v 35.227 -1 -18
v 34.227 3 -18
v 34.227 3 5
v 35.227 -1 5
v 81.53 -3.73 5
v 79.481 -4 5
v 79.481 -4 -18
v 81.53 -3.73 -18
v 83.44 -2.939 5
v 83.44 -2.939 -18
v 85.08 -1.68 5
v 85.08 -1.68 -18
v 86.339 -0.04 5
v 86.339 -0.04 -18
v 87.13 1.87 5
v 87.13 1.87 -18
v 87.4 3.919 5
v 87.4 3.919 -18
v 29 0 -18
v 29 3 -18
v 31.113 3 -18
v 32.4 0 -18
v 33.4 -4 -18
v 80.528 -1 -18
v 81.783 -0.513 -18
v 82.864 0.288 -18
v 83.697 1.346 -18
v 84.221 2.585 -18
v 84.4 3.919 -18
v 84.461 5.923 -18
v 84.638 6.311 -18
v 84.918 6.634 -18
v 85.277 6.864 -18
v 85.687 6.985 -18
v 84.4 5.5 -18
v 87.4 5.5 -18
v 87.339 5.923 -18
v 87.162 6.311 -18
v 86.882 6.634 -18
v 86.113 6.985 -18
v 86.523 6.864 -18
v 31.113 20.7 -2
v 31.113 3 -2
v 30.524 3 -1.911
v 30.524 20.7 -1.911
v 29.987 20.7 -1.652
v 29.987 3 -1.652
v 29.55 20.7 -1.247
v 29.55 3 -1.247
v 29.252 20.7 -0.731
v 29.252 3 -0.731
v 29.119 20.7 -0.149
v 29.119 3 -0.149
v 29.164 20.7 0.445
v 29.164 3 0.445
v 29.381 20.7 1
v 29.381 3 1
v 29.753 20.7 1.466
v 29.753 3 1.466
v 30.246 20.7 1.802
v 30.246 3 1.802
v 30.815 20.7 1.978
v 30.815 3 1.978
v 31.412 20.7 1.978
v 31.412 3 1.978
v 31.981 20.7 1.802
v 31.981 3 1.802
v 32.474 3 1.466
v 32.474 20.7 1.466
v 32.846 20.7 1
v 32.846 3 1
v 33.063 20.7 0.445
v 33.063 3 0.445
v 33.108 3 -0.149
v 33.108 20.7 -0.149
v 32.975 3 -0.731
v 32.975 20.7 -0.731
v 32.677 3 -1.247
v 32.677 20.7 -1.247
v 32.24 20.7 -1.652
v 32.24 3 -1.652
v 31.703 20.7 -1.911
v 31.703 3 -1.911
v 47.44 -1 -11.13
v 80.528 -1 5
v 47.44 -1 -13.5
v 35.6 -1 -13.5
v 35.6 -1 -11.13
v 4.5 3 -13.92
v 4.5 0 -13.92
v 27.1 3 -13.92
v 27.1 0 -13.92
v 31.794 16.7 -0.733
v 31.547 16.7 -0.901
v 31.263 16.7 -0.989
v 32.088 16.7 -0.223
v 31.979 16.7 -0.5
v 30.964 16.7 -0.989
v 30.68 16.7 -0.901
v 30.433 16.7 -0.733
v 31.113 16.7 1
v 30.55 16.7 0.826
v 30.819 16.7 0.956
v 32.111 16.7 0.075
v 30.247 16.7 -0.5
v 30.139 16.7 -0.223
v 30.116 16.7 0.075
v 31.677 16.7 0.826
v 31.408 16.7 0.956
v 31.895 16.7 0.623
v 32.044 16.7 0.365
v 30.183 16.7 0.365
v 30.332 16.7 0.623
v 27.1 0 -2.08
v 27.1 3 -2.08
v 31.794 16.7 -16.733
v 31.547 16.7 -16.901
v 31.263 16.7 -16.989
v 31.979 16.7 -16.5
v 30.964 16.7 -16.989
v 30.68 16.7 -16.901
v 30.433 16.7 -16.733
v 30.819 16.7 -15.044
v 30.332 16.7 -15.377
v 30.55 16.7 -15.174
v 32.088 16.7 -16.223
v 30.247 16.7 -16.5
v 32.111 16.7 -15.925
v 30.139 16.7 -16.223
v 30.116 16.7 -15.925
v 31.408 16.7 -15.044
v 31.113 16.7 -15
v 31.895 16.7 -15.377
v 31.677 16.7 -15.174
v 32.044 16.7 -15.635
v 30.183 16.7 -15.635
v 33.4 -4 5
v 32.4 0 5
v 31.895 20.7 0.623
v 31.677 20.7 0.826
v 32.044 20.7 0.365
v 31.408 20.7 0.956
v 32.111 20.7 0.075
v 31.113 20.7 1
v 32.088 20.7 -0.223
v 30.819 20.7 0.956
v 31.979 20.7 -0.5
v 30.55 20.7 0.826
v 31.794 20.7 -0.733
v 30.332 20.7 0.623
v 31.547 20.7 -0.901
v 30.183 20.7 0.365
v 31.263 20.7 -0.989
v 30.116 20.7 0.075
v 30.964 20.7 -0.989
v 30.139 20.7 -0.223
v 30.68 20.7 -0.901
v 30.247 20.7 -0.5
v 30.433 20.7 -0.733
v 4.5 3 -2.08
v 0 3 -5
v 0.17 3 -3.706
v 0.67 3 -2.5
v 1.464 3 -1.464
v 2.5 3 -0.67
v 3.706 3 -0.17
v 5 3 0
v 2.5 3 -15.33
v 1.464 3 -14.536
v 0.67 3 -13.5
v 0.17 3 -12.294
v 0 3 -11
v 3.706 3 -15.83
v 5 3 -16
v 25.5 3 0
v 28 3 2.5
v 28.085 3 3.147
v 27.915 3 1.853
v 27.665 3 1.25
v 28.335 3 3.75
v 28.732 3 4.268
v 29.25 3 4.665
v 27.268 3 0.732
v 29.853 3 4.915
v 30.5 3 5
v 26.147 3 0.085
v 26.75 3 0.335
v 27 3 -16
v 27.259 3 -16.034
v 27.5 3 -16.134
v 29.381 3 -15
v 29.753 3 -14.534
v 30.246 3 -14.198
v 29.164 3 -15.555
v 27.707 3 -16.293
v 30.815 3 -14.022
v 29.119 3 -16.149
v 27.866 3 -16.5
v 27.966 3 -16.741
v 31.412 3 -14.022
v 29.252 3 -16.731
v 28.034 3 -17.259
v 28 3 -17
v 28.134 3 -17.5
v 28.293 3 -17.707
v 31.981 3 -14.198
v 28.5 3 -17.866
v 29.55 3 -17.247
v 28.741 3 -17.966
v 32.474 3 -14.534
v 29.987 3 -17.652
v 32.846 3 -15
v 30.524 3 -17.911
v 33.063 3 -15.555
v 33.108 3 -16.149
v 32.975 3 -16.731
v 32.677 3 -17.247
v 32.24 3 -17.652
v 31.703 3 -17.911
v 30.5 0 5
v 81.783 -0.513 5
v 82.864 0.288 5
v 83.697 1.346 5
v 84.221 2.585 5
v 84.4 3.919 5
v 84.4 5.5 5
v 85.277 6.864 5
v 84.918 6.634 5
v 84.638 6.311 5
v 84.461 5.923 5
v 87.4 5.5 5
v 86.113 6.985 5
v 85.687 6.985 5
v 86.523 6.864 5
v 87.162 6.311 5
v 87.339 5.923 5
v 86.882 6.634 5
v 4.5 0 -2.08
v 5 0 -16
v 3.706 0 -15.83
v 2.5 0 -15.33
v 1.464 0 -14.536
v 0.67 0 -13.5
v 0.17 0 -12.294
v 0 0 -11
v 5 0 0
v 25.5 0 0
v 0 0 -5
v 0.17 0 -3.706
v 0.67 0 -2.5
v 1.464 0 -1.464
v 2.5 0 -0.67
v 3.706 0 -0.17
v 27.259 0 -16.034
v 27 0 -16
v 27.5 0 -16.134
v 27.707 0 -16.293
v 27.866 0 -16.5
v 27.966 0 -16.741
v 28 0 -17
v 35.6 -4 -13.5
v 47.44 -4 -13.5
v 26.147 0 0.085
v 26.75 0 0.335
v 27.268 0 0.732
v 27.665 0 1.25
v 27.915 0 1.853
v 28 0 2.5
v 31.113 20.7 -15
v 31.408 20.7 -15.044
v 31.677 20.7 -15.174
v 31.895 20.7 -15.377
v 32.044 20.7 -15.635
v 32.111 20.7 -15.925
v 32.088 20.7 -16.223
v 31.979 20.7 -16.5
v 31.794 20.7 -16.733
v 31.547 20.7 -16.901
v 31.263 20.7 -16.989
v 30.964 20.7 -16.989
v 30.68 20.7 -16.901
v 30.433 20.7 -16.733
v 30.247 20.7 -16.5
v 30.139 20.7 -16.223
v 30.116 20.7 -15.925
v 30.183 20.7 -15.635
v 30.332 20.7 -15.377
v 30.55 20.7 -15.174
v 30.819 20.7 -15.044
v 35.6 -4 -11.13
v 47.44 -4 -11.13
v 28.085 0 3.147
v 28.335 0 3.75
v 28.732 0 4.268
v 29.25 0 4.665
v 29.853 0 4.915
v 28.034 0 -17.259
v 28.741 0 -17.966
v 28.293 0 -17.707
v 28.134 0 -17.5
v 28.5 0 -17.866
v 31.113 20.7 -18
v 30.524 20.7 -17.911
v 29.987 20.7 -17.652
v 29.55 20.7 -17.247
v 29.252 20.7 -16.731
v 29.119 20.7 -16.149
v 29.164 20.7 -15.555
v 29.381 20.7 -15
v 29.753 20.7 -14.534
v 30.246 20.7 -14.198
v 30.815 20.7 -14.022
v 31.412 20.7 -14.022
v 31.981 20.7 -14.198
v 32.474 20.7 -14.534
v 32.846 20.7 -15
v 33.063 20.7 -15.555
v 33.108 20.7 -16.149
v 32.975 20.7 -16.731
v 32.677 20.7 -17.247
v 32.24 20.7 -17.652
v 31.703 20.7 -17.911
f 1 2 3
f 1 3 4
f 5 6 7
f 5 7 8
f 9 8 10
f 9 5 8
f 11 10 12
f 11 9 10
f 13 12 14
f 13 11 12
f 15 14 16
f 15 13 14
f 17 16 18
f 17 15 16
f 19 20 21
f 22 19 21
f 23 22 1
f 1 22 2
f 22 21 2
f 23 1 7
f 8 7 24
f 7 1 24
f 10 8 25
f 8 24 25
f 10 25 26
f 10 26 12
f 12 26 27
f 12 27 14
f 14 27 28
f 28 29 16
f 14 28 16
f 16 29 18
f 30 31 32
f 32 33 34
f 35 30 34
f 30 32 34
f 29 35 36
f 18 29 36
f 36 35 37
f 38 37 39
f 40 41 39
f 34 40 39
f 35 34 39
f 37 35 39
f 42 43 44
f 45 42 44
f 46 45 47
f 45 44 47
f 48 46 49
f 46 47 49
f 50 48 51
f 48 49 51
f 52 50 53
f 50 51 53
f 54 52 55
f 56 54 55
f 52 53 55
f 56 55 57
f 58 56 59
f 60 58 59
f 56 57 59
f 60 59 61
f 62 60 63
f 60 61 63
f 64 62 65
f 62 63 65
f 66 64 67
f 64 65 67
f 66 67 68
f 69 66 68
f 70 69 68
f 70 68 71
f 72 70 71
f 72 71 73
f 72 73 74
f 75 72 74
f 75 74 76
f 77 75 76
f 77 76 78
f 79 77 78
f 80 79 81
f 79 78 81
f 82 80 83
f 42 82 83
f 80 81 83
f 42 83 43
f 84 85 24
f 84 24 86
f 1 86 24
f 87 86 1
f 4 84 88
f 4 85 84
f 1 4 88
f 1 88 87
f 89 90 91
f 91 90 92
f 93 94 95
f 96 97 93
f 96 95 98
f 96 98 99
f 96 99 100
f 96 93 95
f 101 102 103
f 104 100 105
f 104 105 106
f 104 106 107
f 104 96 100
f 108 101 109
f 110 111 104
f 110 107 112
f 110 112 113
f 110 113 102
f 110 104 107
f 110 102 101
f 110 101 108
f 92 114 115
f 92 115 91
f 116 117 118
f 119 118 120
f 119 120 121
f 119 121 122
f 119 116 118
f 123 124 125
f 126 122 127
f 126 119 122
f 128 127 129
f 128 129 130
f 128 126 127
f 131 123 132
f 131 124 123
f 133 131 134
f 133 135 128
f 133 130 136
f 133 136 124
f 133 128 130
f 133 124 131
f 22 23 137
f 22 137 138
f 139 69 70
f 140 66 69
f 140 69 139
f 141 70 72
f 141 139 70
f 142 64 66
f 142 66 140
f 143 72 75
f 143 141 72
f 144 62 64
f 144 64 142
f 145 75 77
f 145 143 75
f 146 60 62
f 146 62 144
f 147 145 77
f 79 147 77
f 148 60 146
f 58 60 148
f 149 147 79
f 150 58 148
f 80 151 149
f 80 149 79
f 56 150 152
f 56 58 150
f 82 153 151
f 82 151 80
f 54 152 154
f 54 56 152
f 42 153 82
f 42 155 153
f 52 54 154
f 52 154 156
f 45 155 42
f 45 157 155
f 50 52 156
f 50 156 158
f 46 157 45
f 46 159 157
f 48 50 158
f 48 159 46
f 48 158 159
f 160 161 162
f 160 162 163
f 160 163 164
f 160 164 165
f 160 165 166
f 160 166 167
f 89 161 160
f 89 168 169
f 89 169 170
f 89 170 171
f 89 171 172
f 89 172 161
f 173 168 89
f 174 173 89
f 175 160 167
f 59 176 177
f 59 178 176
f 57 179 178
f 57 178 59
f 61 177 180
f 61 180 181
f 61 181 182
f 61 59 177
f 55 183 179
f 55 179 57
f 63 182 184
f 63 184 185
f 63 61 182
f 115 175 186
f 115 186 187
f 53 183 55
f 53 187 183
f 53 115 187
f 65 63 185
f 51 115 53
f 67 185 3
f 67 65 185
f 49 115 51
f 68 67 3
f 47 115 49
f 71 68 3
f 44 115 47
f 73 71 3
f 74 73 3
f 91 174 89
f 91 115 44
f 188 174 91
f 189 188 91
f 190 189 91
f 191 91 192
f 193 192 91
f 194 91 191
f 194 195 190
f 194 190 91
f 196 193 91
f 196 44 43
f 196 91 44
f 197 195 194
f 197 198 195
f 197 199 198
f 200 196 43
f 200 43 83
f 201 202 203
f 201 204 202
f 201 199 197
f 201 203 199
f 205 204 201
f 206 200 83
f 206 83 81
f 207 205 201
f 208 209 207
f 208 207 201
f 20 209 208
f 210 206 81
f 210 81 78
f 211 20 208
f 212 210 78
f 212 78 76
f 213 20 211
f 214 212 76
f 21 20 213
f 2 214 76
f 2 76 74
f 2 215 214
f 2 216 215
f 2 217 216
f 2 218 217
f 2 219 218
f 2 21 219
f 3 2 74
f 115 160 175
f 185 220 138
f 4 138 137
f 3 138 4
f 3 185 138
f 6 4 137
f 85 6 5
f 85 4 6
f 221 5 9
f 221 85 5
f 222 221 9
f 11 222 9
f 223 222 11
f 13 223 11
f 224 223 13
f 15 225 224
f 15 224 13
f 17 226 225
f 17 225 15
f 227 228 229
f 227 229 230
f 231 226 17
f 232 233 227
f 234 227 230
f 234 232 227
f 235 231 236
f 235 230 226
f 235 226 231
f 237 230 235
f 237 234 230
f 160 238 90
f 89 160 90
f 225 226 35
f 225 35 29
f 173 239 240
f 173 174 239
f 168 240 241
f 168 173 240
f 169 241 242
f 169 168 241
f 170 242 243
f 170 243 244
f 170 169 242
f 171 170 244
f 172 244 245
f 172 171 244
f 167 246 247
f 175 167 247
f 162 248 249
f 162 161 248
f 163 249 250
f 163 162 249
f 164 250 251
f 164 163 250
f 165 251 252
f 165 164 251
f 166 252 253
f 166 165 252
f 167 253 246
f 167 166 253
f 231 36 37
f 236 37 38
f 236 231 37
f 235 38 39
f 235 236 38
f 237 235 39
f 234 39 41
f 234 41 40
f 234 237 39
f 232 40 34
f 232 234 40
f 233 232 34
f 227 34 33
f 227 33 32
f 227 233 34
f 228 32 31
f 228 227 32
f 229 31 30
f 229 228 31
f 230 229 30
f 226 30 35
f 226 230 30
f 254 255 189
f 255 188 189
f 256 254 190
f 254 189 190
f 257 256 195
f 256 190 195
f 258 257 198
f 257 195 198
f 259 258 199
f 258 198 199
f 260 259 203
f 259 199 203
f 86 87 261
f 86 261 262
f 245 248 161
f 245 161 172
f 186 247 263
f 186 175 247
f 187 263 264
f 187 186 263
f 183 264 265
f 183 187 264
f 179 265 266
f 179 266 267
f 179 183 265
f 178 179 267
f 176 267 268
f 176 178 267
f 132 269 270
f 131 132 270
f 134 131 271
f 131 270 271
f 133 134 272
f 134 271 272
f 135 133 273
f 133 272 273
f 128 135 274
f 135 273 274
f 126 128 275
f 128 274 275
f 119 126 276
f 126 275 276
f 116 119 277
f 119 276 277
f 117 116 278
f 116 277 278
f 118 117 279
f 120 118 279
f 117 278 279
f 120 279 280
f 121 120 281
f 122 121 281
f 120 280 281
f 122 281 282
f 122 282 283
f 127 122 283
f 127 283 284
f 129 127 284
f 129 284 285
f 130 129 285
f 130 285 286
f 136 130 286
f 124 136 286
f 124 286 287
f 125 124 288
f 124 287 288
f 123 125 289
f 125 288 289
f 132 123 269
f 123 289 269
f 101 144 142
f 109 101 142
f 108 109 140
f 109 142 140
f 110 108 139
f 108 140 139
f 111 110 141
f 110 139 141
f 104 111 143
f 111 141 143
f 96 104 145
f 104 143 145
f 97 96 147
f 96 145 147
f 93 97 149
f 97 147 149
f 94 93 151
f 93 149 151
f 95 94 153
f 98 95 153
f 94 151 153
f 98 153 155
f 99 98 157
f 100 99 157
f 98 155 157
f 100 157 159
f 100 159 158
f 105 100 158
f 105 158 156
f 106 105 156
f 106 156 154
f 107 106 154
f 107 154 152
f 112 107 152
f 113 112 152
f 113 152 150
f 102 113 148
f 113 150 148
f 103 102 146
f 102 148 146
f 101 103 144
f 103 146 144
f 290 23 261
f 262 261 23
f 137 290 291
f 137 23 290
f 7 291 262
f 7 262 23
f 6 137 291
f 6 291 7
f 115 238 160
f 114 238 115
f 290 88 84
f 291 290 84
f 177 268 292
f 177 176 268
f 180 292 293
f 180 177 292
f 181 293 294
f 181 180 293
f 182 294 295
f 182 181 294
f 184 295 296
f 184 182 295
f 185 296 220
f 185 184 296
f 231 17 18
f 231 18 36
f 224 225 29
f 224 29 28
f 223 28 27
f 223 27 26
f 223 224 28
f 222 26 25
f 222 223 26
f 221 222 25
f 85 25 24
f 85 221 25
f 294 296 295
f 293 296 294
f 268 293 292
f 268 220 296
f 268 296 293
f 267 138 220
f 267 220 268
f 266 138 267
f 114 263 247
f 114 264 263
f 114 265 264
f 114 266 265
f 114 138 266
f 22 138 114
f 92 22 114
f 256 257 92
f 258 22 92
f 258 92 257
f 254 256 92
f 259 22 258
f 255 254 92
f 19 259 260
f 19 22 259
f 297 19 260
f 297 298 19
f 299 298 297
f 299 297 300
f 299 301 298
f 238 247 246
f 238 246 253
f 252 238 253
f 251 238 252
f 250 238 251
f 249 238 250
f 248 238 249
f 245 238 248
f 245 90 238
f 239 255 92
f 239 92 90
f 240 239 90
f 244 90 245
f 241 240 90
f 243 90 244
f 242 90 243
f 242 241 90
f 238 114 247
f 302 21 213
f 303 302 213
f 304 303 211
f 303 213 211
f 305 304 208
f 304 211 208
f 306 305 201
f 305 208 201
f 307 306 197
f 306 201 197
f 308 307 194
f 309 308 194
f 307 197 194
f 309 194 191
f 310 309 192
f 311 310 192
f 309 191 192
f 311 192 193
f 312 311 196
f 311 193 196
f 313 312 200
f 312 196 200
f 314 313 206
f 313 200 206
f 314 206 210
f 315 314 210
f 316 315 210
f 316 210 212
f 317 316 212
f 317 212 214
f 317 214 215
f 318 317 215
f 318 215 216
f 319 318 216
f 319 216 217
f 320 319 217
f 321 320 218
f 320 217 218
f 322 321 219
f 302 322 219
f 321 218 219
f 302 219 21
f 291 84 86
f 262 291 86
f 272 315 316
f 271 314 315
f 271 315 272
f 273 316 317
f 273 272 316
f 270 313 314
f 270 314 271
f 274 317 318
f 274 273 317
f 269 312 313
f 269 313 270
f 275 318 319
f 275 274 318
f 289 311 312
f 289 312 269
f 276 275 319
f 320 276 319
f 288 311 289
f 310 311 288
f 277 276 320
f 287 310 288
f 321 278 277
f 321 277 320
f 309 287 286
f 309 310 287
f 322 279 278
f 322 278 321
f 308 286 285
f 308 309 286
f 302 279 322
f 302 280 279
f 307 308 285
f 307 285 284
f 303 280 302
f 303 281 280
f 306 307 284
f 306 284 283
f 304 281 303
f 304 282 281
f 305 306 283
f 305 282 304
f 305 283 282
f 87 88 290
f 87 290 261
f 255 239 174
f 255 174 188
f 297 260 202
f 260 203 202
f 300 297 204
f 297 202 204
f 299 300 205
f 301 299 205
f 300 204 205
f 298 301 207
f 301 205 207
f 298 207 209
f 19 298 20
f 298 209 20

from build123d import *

# Parameters (mm, degrees)
SKETCH1_W               = 28
SKETCH1_H               = 16
SKETCH1_W_2             = 22.6
SKETCH1_H_2             = 11.84
BOSS_EXTRUDE1_DEPTH     = 3
BOSS_EXTRU_1_DEPTH      = 5
BOSS_EXTRU_1_DEPTH_BACK = 18
ESQUISSE6_R             = 2
BOSS_EXTRU_3_DEPTH      = 17.7
ESQUISSE7_R             = 1
ENL_V_MAT_EXTRU_3_DEPTH = 4
ESQUISSE8_W             = 11.84
ESQUISSE8_H             = 2.37
ENL_V_MAT_EXTRU_4_DEPTH = 10
CONG_1_R                = 1
CONG_3_R                = 5
CONG_4_R                = 2.5
BOSS_EXTRUDE2_DEPTH     = 23


with BuildPart() as part:
    # Sketch1 → Boss-Extrude1 (new body)
    with BuildSketch(Plane(origin=(0, 0, 0), x_dir=(1, 0, 0), z_dir=(0, 1, 0))):
        with Locations((14, 8)):
            Rectangle(SKETCH1_W, SKETCH1_H)
        with Locations((15.8, 8)):
            Rectangle(SKETCH1_W_2, SKETCH1_H_2, mode=Mode.SUBTRACT)
    extrude(amount=BOSS_EXTRUDE1_DEPTH)

    # Esquisse1 → Boss.-Extru.1 (add, two sides: drawn at the far end of the back side and taken through both)
    with BuildSketch(Plane.XY.offset(-BOSS_EXTRU_1_DEPTH_BACK)):
        Polygon((34.226941016, 3), (35.226941016, -1), (62.4, -1), (62.4, -4), (33.4, -4), (32.4, 0), (28, 0), (28, 3), align=None)
    extrude(amount=BOSS_EXTRU_1_DEPTH + BOSS_EXTRU_1_DEPTH_BACK)

    # Esquisse6 → Boss.-Extru.3 (add)
    with BuildSketch(Plane(origin=(0, 3, 0), x_dir=(1, 0, 0), z_dir=(0, 1, 0))):
        with Locations(Location((31.113470508, 0, 0), (0, 0, 90))):
            Circle(ESQUISSE6_R)
        with Locations(Location((31.113470508, 16, 0), (0, 0, 90))):
            Circle(ESQUISSE6_R)
    extrude(amount=BOSS_EXTRU_3_DEPTH)

    # Esquisse7 → Enlèv. mat.-Extru.3 (cut)
    with BuildSketch(Plane(origin=(0, 20.7, 0), x_dir=(1, 0, 0), z_dir=(0, 1, 0))):
        with Locations(Location((31.113470508, 16, 0), (0, 0, 270))):
            Circle(ESQUISSE7_R)
        with Locations(Location((31.113470508, 0, 0), (0, 0, 270))):
            Circle(ESQUISSE7_R)
    extrude(amount=-ENL_V_MAT_EXTRU_3_DEPTH, mode=Mode.SUBTRACT)

    # Esquisse8 → Enlèv. mat.-Extru.4 (cut)
    with BuildSketch(Plane(origin=(0, -1, 0), x_dir=(1, 0, 0), z_dir=(0, 1, 0))):
        with Locations((41.52, 12.315)):
            Rectangle(ESQUISSE8_W, ESQUISSE8_H)
    extrude(amount=-ENL_V_MAT_EXTRU_4_DEPTH, mode=Mode.SUBTRACT)

    # Congé1
    cong_1_edges = [part.edges().sort_by_distance(p)[0] for p in [
        (28, 1.5, -16),
    ]]
    fillet(cong_1_edges, radius=CONG_1_R)
    cong_1_2_edges = [part.edges().sort_by_distance(p)[0] for p in [
        (28, 1.5, -18),
    ]]
    fillet(cong_1_2_edges, radius=CONG_1_R - 0.0001)  # a hair under: the kernel refuses the full size

    # Congé3
    cong_3_edges = [part.edges().sort_by_distance(p)[0] for p in [
        (0, 1.5, 0),
        (0, 1.5, -16),
    ]]
    fillet(cong_3_edges, radius=CONG_3_R)

    # Congé4
    cong_4_edges = [part.edges().sort_by_distance(p)[0] for p in [
        (28, 1.5, 0),
    ]]
    fillet(cong_4_edges, radius=CONG_4_R)
    cong_4_2_edges = [part.edges().sort_by_distance(p)[0] for p in [
        (28, 1.5, 5),
    ]]
    fillet(cong_4_2_edges, radius=CONG_4_R - 0.0001)  # a hair under: the kernel refuses the full size

    # Sketch3 → Boss-Extrude2 (add)
    with BuildSketch(Plane.XY.offset(5)):
        with BuildLine():
            Line((62.4, -1), (62.4, -4))
            Line((62.4, -4), (79.480551105, -4))
            ThreePointArc((79.480551105, -4), (85.080447122, -1.680447122), (87.4, 3.919448895))
            Line((87.4, 3.919448895), (87.4, 5.5))
            ThreePointArc((87.4, 5.5), (85.9, 7), (84.4, 5.5))
            Line((84.4, 5.5), (84.4, 3.919448895))
            ThreePointArc((84.4, 3.919448895), (83.315910874, 0.78923852), (80.528063722, -1))
            Line((80.528063722, -1), (79.4, -1))
            Line((79.4, -1), (71.856339273, -1))
            Line((71.856339273, -1), (62.4, -1))
        make_face()
    extrude(amount=-BOSS_EXTRUDE2_DEPTH)


solid = part.part
